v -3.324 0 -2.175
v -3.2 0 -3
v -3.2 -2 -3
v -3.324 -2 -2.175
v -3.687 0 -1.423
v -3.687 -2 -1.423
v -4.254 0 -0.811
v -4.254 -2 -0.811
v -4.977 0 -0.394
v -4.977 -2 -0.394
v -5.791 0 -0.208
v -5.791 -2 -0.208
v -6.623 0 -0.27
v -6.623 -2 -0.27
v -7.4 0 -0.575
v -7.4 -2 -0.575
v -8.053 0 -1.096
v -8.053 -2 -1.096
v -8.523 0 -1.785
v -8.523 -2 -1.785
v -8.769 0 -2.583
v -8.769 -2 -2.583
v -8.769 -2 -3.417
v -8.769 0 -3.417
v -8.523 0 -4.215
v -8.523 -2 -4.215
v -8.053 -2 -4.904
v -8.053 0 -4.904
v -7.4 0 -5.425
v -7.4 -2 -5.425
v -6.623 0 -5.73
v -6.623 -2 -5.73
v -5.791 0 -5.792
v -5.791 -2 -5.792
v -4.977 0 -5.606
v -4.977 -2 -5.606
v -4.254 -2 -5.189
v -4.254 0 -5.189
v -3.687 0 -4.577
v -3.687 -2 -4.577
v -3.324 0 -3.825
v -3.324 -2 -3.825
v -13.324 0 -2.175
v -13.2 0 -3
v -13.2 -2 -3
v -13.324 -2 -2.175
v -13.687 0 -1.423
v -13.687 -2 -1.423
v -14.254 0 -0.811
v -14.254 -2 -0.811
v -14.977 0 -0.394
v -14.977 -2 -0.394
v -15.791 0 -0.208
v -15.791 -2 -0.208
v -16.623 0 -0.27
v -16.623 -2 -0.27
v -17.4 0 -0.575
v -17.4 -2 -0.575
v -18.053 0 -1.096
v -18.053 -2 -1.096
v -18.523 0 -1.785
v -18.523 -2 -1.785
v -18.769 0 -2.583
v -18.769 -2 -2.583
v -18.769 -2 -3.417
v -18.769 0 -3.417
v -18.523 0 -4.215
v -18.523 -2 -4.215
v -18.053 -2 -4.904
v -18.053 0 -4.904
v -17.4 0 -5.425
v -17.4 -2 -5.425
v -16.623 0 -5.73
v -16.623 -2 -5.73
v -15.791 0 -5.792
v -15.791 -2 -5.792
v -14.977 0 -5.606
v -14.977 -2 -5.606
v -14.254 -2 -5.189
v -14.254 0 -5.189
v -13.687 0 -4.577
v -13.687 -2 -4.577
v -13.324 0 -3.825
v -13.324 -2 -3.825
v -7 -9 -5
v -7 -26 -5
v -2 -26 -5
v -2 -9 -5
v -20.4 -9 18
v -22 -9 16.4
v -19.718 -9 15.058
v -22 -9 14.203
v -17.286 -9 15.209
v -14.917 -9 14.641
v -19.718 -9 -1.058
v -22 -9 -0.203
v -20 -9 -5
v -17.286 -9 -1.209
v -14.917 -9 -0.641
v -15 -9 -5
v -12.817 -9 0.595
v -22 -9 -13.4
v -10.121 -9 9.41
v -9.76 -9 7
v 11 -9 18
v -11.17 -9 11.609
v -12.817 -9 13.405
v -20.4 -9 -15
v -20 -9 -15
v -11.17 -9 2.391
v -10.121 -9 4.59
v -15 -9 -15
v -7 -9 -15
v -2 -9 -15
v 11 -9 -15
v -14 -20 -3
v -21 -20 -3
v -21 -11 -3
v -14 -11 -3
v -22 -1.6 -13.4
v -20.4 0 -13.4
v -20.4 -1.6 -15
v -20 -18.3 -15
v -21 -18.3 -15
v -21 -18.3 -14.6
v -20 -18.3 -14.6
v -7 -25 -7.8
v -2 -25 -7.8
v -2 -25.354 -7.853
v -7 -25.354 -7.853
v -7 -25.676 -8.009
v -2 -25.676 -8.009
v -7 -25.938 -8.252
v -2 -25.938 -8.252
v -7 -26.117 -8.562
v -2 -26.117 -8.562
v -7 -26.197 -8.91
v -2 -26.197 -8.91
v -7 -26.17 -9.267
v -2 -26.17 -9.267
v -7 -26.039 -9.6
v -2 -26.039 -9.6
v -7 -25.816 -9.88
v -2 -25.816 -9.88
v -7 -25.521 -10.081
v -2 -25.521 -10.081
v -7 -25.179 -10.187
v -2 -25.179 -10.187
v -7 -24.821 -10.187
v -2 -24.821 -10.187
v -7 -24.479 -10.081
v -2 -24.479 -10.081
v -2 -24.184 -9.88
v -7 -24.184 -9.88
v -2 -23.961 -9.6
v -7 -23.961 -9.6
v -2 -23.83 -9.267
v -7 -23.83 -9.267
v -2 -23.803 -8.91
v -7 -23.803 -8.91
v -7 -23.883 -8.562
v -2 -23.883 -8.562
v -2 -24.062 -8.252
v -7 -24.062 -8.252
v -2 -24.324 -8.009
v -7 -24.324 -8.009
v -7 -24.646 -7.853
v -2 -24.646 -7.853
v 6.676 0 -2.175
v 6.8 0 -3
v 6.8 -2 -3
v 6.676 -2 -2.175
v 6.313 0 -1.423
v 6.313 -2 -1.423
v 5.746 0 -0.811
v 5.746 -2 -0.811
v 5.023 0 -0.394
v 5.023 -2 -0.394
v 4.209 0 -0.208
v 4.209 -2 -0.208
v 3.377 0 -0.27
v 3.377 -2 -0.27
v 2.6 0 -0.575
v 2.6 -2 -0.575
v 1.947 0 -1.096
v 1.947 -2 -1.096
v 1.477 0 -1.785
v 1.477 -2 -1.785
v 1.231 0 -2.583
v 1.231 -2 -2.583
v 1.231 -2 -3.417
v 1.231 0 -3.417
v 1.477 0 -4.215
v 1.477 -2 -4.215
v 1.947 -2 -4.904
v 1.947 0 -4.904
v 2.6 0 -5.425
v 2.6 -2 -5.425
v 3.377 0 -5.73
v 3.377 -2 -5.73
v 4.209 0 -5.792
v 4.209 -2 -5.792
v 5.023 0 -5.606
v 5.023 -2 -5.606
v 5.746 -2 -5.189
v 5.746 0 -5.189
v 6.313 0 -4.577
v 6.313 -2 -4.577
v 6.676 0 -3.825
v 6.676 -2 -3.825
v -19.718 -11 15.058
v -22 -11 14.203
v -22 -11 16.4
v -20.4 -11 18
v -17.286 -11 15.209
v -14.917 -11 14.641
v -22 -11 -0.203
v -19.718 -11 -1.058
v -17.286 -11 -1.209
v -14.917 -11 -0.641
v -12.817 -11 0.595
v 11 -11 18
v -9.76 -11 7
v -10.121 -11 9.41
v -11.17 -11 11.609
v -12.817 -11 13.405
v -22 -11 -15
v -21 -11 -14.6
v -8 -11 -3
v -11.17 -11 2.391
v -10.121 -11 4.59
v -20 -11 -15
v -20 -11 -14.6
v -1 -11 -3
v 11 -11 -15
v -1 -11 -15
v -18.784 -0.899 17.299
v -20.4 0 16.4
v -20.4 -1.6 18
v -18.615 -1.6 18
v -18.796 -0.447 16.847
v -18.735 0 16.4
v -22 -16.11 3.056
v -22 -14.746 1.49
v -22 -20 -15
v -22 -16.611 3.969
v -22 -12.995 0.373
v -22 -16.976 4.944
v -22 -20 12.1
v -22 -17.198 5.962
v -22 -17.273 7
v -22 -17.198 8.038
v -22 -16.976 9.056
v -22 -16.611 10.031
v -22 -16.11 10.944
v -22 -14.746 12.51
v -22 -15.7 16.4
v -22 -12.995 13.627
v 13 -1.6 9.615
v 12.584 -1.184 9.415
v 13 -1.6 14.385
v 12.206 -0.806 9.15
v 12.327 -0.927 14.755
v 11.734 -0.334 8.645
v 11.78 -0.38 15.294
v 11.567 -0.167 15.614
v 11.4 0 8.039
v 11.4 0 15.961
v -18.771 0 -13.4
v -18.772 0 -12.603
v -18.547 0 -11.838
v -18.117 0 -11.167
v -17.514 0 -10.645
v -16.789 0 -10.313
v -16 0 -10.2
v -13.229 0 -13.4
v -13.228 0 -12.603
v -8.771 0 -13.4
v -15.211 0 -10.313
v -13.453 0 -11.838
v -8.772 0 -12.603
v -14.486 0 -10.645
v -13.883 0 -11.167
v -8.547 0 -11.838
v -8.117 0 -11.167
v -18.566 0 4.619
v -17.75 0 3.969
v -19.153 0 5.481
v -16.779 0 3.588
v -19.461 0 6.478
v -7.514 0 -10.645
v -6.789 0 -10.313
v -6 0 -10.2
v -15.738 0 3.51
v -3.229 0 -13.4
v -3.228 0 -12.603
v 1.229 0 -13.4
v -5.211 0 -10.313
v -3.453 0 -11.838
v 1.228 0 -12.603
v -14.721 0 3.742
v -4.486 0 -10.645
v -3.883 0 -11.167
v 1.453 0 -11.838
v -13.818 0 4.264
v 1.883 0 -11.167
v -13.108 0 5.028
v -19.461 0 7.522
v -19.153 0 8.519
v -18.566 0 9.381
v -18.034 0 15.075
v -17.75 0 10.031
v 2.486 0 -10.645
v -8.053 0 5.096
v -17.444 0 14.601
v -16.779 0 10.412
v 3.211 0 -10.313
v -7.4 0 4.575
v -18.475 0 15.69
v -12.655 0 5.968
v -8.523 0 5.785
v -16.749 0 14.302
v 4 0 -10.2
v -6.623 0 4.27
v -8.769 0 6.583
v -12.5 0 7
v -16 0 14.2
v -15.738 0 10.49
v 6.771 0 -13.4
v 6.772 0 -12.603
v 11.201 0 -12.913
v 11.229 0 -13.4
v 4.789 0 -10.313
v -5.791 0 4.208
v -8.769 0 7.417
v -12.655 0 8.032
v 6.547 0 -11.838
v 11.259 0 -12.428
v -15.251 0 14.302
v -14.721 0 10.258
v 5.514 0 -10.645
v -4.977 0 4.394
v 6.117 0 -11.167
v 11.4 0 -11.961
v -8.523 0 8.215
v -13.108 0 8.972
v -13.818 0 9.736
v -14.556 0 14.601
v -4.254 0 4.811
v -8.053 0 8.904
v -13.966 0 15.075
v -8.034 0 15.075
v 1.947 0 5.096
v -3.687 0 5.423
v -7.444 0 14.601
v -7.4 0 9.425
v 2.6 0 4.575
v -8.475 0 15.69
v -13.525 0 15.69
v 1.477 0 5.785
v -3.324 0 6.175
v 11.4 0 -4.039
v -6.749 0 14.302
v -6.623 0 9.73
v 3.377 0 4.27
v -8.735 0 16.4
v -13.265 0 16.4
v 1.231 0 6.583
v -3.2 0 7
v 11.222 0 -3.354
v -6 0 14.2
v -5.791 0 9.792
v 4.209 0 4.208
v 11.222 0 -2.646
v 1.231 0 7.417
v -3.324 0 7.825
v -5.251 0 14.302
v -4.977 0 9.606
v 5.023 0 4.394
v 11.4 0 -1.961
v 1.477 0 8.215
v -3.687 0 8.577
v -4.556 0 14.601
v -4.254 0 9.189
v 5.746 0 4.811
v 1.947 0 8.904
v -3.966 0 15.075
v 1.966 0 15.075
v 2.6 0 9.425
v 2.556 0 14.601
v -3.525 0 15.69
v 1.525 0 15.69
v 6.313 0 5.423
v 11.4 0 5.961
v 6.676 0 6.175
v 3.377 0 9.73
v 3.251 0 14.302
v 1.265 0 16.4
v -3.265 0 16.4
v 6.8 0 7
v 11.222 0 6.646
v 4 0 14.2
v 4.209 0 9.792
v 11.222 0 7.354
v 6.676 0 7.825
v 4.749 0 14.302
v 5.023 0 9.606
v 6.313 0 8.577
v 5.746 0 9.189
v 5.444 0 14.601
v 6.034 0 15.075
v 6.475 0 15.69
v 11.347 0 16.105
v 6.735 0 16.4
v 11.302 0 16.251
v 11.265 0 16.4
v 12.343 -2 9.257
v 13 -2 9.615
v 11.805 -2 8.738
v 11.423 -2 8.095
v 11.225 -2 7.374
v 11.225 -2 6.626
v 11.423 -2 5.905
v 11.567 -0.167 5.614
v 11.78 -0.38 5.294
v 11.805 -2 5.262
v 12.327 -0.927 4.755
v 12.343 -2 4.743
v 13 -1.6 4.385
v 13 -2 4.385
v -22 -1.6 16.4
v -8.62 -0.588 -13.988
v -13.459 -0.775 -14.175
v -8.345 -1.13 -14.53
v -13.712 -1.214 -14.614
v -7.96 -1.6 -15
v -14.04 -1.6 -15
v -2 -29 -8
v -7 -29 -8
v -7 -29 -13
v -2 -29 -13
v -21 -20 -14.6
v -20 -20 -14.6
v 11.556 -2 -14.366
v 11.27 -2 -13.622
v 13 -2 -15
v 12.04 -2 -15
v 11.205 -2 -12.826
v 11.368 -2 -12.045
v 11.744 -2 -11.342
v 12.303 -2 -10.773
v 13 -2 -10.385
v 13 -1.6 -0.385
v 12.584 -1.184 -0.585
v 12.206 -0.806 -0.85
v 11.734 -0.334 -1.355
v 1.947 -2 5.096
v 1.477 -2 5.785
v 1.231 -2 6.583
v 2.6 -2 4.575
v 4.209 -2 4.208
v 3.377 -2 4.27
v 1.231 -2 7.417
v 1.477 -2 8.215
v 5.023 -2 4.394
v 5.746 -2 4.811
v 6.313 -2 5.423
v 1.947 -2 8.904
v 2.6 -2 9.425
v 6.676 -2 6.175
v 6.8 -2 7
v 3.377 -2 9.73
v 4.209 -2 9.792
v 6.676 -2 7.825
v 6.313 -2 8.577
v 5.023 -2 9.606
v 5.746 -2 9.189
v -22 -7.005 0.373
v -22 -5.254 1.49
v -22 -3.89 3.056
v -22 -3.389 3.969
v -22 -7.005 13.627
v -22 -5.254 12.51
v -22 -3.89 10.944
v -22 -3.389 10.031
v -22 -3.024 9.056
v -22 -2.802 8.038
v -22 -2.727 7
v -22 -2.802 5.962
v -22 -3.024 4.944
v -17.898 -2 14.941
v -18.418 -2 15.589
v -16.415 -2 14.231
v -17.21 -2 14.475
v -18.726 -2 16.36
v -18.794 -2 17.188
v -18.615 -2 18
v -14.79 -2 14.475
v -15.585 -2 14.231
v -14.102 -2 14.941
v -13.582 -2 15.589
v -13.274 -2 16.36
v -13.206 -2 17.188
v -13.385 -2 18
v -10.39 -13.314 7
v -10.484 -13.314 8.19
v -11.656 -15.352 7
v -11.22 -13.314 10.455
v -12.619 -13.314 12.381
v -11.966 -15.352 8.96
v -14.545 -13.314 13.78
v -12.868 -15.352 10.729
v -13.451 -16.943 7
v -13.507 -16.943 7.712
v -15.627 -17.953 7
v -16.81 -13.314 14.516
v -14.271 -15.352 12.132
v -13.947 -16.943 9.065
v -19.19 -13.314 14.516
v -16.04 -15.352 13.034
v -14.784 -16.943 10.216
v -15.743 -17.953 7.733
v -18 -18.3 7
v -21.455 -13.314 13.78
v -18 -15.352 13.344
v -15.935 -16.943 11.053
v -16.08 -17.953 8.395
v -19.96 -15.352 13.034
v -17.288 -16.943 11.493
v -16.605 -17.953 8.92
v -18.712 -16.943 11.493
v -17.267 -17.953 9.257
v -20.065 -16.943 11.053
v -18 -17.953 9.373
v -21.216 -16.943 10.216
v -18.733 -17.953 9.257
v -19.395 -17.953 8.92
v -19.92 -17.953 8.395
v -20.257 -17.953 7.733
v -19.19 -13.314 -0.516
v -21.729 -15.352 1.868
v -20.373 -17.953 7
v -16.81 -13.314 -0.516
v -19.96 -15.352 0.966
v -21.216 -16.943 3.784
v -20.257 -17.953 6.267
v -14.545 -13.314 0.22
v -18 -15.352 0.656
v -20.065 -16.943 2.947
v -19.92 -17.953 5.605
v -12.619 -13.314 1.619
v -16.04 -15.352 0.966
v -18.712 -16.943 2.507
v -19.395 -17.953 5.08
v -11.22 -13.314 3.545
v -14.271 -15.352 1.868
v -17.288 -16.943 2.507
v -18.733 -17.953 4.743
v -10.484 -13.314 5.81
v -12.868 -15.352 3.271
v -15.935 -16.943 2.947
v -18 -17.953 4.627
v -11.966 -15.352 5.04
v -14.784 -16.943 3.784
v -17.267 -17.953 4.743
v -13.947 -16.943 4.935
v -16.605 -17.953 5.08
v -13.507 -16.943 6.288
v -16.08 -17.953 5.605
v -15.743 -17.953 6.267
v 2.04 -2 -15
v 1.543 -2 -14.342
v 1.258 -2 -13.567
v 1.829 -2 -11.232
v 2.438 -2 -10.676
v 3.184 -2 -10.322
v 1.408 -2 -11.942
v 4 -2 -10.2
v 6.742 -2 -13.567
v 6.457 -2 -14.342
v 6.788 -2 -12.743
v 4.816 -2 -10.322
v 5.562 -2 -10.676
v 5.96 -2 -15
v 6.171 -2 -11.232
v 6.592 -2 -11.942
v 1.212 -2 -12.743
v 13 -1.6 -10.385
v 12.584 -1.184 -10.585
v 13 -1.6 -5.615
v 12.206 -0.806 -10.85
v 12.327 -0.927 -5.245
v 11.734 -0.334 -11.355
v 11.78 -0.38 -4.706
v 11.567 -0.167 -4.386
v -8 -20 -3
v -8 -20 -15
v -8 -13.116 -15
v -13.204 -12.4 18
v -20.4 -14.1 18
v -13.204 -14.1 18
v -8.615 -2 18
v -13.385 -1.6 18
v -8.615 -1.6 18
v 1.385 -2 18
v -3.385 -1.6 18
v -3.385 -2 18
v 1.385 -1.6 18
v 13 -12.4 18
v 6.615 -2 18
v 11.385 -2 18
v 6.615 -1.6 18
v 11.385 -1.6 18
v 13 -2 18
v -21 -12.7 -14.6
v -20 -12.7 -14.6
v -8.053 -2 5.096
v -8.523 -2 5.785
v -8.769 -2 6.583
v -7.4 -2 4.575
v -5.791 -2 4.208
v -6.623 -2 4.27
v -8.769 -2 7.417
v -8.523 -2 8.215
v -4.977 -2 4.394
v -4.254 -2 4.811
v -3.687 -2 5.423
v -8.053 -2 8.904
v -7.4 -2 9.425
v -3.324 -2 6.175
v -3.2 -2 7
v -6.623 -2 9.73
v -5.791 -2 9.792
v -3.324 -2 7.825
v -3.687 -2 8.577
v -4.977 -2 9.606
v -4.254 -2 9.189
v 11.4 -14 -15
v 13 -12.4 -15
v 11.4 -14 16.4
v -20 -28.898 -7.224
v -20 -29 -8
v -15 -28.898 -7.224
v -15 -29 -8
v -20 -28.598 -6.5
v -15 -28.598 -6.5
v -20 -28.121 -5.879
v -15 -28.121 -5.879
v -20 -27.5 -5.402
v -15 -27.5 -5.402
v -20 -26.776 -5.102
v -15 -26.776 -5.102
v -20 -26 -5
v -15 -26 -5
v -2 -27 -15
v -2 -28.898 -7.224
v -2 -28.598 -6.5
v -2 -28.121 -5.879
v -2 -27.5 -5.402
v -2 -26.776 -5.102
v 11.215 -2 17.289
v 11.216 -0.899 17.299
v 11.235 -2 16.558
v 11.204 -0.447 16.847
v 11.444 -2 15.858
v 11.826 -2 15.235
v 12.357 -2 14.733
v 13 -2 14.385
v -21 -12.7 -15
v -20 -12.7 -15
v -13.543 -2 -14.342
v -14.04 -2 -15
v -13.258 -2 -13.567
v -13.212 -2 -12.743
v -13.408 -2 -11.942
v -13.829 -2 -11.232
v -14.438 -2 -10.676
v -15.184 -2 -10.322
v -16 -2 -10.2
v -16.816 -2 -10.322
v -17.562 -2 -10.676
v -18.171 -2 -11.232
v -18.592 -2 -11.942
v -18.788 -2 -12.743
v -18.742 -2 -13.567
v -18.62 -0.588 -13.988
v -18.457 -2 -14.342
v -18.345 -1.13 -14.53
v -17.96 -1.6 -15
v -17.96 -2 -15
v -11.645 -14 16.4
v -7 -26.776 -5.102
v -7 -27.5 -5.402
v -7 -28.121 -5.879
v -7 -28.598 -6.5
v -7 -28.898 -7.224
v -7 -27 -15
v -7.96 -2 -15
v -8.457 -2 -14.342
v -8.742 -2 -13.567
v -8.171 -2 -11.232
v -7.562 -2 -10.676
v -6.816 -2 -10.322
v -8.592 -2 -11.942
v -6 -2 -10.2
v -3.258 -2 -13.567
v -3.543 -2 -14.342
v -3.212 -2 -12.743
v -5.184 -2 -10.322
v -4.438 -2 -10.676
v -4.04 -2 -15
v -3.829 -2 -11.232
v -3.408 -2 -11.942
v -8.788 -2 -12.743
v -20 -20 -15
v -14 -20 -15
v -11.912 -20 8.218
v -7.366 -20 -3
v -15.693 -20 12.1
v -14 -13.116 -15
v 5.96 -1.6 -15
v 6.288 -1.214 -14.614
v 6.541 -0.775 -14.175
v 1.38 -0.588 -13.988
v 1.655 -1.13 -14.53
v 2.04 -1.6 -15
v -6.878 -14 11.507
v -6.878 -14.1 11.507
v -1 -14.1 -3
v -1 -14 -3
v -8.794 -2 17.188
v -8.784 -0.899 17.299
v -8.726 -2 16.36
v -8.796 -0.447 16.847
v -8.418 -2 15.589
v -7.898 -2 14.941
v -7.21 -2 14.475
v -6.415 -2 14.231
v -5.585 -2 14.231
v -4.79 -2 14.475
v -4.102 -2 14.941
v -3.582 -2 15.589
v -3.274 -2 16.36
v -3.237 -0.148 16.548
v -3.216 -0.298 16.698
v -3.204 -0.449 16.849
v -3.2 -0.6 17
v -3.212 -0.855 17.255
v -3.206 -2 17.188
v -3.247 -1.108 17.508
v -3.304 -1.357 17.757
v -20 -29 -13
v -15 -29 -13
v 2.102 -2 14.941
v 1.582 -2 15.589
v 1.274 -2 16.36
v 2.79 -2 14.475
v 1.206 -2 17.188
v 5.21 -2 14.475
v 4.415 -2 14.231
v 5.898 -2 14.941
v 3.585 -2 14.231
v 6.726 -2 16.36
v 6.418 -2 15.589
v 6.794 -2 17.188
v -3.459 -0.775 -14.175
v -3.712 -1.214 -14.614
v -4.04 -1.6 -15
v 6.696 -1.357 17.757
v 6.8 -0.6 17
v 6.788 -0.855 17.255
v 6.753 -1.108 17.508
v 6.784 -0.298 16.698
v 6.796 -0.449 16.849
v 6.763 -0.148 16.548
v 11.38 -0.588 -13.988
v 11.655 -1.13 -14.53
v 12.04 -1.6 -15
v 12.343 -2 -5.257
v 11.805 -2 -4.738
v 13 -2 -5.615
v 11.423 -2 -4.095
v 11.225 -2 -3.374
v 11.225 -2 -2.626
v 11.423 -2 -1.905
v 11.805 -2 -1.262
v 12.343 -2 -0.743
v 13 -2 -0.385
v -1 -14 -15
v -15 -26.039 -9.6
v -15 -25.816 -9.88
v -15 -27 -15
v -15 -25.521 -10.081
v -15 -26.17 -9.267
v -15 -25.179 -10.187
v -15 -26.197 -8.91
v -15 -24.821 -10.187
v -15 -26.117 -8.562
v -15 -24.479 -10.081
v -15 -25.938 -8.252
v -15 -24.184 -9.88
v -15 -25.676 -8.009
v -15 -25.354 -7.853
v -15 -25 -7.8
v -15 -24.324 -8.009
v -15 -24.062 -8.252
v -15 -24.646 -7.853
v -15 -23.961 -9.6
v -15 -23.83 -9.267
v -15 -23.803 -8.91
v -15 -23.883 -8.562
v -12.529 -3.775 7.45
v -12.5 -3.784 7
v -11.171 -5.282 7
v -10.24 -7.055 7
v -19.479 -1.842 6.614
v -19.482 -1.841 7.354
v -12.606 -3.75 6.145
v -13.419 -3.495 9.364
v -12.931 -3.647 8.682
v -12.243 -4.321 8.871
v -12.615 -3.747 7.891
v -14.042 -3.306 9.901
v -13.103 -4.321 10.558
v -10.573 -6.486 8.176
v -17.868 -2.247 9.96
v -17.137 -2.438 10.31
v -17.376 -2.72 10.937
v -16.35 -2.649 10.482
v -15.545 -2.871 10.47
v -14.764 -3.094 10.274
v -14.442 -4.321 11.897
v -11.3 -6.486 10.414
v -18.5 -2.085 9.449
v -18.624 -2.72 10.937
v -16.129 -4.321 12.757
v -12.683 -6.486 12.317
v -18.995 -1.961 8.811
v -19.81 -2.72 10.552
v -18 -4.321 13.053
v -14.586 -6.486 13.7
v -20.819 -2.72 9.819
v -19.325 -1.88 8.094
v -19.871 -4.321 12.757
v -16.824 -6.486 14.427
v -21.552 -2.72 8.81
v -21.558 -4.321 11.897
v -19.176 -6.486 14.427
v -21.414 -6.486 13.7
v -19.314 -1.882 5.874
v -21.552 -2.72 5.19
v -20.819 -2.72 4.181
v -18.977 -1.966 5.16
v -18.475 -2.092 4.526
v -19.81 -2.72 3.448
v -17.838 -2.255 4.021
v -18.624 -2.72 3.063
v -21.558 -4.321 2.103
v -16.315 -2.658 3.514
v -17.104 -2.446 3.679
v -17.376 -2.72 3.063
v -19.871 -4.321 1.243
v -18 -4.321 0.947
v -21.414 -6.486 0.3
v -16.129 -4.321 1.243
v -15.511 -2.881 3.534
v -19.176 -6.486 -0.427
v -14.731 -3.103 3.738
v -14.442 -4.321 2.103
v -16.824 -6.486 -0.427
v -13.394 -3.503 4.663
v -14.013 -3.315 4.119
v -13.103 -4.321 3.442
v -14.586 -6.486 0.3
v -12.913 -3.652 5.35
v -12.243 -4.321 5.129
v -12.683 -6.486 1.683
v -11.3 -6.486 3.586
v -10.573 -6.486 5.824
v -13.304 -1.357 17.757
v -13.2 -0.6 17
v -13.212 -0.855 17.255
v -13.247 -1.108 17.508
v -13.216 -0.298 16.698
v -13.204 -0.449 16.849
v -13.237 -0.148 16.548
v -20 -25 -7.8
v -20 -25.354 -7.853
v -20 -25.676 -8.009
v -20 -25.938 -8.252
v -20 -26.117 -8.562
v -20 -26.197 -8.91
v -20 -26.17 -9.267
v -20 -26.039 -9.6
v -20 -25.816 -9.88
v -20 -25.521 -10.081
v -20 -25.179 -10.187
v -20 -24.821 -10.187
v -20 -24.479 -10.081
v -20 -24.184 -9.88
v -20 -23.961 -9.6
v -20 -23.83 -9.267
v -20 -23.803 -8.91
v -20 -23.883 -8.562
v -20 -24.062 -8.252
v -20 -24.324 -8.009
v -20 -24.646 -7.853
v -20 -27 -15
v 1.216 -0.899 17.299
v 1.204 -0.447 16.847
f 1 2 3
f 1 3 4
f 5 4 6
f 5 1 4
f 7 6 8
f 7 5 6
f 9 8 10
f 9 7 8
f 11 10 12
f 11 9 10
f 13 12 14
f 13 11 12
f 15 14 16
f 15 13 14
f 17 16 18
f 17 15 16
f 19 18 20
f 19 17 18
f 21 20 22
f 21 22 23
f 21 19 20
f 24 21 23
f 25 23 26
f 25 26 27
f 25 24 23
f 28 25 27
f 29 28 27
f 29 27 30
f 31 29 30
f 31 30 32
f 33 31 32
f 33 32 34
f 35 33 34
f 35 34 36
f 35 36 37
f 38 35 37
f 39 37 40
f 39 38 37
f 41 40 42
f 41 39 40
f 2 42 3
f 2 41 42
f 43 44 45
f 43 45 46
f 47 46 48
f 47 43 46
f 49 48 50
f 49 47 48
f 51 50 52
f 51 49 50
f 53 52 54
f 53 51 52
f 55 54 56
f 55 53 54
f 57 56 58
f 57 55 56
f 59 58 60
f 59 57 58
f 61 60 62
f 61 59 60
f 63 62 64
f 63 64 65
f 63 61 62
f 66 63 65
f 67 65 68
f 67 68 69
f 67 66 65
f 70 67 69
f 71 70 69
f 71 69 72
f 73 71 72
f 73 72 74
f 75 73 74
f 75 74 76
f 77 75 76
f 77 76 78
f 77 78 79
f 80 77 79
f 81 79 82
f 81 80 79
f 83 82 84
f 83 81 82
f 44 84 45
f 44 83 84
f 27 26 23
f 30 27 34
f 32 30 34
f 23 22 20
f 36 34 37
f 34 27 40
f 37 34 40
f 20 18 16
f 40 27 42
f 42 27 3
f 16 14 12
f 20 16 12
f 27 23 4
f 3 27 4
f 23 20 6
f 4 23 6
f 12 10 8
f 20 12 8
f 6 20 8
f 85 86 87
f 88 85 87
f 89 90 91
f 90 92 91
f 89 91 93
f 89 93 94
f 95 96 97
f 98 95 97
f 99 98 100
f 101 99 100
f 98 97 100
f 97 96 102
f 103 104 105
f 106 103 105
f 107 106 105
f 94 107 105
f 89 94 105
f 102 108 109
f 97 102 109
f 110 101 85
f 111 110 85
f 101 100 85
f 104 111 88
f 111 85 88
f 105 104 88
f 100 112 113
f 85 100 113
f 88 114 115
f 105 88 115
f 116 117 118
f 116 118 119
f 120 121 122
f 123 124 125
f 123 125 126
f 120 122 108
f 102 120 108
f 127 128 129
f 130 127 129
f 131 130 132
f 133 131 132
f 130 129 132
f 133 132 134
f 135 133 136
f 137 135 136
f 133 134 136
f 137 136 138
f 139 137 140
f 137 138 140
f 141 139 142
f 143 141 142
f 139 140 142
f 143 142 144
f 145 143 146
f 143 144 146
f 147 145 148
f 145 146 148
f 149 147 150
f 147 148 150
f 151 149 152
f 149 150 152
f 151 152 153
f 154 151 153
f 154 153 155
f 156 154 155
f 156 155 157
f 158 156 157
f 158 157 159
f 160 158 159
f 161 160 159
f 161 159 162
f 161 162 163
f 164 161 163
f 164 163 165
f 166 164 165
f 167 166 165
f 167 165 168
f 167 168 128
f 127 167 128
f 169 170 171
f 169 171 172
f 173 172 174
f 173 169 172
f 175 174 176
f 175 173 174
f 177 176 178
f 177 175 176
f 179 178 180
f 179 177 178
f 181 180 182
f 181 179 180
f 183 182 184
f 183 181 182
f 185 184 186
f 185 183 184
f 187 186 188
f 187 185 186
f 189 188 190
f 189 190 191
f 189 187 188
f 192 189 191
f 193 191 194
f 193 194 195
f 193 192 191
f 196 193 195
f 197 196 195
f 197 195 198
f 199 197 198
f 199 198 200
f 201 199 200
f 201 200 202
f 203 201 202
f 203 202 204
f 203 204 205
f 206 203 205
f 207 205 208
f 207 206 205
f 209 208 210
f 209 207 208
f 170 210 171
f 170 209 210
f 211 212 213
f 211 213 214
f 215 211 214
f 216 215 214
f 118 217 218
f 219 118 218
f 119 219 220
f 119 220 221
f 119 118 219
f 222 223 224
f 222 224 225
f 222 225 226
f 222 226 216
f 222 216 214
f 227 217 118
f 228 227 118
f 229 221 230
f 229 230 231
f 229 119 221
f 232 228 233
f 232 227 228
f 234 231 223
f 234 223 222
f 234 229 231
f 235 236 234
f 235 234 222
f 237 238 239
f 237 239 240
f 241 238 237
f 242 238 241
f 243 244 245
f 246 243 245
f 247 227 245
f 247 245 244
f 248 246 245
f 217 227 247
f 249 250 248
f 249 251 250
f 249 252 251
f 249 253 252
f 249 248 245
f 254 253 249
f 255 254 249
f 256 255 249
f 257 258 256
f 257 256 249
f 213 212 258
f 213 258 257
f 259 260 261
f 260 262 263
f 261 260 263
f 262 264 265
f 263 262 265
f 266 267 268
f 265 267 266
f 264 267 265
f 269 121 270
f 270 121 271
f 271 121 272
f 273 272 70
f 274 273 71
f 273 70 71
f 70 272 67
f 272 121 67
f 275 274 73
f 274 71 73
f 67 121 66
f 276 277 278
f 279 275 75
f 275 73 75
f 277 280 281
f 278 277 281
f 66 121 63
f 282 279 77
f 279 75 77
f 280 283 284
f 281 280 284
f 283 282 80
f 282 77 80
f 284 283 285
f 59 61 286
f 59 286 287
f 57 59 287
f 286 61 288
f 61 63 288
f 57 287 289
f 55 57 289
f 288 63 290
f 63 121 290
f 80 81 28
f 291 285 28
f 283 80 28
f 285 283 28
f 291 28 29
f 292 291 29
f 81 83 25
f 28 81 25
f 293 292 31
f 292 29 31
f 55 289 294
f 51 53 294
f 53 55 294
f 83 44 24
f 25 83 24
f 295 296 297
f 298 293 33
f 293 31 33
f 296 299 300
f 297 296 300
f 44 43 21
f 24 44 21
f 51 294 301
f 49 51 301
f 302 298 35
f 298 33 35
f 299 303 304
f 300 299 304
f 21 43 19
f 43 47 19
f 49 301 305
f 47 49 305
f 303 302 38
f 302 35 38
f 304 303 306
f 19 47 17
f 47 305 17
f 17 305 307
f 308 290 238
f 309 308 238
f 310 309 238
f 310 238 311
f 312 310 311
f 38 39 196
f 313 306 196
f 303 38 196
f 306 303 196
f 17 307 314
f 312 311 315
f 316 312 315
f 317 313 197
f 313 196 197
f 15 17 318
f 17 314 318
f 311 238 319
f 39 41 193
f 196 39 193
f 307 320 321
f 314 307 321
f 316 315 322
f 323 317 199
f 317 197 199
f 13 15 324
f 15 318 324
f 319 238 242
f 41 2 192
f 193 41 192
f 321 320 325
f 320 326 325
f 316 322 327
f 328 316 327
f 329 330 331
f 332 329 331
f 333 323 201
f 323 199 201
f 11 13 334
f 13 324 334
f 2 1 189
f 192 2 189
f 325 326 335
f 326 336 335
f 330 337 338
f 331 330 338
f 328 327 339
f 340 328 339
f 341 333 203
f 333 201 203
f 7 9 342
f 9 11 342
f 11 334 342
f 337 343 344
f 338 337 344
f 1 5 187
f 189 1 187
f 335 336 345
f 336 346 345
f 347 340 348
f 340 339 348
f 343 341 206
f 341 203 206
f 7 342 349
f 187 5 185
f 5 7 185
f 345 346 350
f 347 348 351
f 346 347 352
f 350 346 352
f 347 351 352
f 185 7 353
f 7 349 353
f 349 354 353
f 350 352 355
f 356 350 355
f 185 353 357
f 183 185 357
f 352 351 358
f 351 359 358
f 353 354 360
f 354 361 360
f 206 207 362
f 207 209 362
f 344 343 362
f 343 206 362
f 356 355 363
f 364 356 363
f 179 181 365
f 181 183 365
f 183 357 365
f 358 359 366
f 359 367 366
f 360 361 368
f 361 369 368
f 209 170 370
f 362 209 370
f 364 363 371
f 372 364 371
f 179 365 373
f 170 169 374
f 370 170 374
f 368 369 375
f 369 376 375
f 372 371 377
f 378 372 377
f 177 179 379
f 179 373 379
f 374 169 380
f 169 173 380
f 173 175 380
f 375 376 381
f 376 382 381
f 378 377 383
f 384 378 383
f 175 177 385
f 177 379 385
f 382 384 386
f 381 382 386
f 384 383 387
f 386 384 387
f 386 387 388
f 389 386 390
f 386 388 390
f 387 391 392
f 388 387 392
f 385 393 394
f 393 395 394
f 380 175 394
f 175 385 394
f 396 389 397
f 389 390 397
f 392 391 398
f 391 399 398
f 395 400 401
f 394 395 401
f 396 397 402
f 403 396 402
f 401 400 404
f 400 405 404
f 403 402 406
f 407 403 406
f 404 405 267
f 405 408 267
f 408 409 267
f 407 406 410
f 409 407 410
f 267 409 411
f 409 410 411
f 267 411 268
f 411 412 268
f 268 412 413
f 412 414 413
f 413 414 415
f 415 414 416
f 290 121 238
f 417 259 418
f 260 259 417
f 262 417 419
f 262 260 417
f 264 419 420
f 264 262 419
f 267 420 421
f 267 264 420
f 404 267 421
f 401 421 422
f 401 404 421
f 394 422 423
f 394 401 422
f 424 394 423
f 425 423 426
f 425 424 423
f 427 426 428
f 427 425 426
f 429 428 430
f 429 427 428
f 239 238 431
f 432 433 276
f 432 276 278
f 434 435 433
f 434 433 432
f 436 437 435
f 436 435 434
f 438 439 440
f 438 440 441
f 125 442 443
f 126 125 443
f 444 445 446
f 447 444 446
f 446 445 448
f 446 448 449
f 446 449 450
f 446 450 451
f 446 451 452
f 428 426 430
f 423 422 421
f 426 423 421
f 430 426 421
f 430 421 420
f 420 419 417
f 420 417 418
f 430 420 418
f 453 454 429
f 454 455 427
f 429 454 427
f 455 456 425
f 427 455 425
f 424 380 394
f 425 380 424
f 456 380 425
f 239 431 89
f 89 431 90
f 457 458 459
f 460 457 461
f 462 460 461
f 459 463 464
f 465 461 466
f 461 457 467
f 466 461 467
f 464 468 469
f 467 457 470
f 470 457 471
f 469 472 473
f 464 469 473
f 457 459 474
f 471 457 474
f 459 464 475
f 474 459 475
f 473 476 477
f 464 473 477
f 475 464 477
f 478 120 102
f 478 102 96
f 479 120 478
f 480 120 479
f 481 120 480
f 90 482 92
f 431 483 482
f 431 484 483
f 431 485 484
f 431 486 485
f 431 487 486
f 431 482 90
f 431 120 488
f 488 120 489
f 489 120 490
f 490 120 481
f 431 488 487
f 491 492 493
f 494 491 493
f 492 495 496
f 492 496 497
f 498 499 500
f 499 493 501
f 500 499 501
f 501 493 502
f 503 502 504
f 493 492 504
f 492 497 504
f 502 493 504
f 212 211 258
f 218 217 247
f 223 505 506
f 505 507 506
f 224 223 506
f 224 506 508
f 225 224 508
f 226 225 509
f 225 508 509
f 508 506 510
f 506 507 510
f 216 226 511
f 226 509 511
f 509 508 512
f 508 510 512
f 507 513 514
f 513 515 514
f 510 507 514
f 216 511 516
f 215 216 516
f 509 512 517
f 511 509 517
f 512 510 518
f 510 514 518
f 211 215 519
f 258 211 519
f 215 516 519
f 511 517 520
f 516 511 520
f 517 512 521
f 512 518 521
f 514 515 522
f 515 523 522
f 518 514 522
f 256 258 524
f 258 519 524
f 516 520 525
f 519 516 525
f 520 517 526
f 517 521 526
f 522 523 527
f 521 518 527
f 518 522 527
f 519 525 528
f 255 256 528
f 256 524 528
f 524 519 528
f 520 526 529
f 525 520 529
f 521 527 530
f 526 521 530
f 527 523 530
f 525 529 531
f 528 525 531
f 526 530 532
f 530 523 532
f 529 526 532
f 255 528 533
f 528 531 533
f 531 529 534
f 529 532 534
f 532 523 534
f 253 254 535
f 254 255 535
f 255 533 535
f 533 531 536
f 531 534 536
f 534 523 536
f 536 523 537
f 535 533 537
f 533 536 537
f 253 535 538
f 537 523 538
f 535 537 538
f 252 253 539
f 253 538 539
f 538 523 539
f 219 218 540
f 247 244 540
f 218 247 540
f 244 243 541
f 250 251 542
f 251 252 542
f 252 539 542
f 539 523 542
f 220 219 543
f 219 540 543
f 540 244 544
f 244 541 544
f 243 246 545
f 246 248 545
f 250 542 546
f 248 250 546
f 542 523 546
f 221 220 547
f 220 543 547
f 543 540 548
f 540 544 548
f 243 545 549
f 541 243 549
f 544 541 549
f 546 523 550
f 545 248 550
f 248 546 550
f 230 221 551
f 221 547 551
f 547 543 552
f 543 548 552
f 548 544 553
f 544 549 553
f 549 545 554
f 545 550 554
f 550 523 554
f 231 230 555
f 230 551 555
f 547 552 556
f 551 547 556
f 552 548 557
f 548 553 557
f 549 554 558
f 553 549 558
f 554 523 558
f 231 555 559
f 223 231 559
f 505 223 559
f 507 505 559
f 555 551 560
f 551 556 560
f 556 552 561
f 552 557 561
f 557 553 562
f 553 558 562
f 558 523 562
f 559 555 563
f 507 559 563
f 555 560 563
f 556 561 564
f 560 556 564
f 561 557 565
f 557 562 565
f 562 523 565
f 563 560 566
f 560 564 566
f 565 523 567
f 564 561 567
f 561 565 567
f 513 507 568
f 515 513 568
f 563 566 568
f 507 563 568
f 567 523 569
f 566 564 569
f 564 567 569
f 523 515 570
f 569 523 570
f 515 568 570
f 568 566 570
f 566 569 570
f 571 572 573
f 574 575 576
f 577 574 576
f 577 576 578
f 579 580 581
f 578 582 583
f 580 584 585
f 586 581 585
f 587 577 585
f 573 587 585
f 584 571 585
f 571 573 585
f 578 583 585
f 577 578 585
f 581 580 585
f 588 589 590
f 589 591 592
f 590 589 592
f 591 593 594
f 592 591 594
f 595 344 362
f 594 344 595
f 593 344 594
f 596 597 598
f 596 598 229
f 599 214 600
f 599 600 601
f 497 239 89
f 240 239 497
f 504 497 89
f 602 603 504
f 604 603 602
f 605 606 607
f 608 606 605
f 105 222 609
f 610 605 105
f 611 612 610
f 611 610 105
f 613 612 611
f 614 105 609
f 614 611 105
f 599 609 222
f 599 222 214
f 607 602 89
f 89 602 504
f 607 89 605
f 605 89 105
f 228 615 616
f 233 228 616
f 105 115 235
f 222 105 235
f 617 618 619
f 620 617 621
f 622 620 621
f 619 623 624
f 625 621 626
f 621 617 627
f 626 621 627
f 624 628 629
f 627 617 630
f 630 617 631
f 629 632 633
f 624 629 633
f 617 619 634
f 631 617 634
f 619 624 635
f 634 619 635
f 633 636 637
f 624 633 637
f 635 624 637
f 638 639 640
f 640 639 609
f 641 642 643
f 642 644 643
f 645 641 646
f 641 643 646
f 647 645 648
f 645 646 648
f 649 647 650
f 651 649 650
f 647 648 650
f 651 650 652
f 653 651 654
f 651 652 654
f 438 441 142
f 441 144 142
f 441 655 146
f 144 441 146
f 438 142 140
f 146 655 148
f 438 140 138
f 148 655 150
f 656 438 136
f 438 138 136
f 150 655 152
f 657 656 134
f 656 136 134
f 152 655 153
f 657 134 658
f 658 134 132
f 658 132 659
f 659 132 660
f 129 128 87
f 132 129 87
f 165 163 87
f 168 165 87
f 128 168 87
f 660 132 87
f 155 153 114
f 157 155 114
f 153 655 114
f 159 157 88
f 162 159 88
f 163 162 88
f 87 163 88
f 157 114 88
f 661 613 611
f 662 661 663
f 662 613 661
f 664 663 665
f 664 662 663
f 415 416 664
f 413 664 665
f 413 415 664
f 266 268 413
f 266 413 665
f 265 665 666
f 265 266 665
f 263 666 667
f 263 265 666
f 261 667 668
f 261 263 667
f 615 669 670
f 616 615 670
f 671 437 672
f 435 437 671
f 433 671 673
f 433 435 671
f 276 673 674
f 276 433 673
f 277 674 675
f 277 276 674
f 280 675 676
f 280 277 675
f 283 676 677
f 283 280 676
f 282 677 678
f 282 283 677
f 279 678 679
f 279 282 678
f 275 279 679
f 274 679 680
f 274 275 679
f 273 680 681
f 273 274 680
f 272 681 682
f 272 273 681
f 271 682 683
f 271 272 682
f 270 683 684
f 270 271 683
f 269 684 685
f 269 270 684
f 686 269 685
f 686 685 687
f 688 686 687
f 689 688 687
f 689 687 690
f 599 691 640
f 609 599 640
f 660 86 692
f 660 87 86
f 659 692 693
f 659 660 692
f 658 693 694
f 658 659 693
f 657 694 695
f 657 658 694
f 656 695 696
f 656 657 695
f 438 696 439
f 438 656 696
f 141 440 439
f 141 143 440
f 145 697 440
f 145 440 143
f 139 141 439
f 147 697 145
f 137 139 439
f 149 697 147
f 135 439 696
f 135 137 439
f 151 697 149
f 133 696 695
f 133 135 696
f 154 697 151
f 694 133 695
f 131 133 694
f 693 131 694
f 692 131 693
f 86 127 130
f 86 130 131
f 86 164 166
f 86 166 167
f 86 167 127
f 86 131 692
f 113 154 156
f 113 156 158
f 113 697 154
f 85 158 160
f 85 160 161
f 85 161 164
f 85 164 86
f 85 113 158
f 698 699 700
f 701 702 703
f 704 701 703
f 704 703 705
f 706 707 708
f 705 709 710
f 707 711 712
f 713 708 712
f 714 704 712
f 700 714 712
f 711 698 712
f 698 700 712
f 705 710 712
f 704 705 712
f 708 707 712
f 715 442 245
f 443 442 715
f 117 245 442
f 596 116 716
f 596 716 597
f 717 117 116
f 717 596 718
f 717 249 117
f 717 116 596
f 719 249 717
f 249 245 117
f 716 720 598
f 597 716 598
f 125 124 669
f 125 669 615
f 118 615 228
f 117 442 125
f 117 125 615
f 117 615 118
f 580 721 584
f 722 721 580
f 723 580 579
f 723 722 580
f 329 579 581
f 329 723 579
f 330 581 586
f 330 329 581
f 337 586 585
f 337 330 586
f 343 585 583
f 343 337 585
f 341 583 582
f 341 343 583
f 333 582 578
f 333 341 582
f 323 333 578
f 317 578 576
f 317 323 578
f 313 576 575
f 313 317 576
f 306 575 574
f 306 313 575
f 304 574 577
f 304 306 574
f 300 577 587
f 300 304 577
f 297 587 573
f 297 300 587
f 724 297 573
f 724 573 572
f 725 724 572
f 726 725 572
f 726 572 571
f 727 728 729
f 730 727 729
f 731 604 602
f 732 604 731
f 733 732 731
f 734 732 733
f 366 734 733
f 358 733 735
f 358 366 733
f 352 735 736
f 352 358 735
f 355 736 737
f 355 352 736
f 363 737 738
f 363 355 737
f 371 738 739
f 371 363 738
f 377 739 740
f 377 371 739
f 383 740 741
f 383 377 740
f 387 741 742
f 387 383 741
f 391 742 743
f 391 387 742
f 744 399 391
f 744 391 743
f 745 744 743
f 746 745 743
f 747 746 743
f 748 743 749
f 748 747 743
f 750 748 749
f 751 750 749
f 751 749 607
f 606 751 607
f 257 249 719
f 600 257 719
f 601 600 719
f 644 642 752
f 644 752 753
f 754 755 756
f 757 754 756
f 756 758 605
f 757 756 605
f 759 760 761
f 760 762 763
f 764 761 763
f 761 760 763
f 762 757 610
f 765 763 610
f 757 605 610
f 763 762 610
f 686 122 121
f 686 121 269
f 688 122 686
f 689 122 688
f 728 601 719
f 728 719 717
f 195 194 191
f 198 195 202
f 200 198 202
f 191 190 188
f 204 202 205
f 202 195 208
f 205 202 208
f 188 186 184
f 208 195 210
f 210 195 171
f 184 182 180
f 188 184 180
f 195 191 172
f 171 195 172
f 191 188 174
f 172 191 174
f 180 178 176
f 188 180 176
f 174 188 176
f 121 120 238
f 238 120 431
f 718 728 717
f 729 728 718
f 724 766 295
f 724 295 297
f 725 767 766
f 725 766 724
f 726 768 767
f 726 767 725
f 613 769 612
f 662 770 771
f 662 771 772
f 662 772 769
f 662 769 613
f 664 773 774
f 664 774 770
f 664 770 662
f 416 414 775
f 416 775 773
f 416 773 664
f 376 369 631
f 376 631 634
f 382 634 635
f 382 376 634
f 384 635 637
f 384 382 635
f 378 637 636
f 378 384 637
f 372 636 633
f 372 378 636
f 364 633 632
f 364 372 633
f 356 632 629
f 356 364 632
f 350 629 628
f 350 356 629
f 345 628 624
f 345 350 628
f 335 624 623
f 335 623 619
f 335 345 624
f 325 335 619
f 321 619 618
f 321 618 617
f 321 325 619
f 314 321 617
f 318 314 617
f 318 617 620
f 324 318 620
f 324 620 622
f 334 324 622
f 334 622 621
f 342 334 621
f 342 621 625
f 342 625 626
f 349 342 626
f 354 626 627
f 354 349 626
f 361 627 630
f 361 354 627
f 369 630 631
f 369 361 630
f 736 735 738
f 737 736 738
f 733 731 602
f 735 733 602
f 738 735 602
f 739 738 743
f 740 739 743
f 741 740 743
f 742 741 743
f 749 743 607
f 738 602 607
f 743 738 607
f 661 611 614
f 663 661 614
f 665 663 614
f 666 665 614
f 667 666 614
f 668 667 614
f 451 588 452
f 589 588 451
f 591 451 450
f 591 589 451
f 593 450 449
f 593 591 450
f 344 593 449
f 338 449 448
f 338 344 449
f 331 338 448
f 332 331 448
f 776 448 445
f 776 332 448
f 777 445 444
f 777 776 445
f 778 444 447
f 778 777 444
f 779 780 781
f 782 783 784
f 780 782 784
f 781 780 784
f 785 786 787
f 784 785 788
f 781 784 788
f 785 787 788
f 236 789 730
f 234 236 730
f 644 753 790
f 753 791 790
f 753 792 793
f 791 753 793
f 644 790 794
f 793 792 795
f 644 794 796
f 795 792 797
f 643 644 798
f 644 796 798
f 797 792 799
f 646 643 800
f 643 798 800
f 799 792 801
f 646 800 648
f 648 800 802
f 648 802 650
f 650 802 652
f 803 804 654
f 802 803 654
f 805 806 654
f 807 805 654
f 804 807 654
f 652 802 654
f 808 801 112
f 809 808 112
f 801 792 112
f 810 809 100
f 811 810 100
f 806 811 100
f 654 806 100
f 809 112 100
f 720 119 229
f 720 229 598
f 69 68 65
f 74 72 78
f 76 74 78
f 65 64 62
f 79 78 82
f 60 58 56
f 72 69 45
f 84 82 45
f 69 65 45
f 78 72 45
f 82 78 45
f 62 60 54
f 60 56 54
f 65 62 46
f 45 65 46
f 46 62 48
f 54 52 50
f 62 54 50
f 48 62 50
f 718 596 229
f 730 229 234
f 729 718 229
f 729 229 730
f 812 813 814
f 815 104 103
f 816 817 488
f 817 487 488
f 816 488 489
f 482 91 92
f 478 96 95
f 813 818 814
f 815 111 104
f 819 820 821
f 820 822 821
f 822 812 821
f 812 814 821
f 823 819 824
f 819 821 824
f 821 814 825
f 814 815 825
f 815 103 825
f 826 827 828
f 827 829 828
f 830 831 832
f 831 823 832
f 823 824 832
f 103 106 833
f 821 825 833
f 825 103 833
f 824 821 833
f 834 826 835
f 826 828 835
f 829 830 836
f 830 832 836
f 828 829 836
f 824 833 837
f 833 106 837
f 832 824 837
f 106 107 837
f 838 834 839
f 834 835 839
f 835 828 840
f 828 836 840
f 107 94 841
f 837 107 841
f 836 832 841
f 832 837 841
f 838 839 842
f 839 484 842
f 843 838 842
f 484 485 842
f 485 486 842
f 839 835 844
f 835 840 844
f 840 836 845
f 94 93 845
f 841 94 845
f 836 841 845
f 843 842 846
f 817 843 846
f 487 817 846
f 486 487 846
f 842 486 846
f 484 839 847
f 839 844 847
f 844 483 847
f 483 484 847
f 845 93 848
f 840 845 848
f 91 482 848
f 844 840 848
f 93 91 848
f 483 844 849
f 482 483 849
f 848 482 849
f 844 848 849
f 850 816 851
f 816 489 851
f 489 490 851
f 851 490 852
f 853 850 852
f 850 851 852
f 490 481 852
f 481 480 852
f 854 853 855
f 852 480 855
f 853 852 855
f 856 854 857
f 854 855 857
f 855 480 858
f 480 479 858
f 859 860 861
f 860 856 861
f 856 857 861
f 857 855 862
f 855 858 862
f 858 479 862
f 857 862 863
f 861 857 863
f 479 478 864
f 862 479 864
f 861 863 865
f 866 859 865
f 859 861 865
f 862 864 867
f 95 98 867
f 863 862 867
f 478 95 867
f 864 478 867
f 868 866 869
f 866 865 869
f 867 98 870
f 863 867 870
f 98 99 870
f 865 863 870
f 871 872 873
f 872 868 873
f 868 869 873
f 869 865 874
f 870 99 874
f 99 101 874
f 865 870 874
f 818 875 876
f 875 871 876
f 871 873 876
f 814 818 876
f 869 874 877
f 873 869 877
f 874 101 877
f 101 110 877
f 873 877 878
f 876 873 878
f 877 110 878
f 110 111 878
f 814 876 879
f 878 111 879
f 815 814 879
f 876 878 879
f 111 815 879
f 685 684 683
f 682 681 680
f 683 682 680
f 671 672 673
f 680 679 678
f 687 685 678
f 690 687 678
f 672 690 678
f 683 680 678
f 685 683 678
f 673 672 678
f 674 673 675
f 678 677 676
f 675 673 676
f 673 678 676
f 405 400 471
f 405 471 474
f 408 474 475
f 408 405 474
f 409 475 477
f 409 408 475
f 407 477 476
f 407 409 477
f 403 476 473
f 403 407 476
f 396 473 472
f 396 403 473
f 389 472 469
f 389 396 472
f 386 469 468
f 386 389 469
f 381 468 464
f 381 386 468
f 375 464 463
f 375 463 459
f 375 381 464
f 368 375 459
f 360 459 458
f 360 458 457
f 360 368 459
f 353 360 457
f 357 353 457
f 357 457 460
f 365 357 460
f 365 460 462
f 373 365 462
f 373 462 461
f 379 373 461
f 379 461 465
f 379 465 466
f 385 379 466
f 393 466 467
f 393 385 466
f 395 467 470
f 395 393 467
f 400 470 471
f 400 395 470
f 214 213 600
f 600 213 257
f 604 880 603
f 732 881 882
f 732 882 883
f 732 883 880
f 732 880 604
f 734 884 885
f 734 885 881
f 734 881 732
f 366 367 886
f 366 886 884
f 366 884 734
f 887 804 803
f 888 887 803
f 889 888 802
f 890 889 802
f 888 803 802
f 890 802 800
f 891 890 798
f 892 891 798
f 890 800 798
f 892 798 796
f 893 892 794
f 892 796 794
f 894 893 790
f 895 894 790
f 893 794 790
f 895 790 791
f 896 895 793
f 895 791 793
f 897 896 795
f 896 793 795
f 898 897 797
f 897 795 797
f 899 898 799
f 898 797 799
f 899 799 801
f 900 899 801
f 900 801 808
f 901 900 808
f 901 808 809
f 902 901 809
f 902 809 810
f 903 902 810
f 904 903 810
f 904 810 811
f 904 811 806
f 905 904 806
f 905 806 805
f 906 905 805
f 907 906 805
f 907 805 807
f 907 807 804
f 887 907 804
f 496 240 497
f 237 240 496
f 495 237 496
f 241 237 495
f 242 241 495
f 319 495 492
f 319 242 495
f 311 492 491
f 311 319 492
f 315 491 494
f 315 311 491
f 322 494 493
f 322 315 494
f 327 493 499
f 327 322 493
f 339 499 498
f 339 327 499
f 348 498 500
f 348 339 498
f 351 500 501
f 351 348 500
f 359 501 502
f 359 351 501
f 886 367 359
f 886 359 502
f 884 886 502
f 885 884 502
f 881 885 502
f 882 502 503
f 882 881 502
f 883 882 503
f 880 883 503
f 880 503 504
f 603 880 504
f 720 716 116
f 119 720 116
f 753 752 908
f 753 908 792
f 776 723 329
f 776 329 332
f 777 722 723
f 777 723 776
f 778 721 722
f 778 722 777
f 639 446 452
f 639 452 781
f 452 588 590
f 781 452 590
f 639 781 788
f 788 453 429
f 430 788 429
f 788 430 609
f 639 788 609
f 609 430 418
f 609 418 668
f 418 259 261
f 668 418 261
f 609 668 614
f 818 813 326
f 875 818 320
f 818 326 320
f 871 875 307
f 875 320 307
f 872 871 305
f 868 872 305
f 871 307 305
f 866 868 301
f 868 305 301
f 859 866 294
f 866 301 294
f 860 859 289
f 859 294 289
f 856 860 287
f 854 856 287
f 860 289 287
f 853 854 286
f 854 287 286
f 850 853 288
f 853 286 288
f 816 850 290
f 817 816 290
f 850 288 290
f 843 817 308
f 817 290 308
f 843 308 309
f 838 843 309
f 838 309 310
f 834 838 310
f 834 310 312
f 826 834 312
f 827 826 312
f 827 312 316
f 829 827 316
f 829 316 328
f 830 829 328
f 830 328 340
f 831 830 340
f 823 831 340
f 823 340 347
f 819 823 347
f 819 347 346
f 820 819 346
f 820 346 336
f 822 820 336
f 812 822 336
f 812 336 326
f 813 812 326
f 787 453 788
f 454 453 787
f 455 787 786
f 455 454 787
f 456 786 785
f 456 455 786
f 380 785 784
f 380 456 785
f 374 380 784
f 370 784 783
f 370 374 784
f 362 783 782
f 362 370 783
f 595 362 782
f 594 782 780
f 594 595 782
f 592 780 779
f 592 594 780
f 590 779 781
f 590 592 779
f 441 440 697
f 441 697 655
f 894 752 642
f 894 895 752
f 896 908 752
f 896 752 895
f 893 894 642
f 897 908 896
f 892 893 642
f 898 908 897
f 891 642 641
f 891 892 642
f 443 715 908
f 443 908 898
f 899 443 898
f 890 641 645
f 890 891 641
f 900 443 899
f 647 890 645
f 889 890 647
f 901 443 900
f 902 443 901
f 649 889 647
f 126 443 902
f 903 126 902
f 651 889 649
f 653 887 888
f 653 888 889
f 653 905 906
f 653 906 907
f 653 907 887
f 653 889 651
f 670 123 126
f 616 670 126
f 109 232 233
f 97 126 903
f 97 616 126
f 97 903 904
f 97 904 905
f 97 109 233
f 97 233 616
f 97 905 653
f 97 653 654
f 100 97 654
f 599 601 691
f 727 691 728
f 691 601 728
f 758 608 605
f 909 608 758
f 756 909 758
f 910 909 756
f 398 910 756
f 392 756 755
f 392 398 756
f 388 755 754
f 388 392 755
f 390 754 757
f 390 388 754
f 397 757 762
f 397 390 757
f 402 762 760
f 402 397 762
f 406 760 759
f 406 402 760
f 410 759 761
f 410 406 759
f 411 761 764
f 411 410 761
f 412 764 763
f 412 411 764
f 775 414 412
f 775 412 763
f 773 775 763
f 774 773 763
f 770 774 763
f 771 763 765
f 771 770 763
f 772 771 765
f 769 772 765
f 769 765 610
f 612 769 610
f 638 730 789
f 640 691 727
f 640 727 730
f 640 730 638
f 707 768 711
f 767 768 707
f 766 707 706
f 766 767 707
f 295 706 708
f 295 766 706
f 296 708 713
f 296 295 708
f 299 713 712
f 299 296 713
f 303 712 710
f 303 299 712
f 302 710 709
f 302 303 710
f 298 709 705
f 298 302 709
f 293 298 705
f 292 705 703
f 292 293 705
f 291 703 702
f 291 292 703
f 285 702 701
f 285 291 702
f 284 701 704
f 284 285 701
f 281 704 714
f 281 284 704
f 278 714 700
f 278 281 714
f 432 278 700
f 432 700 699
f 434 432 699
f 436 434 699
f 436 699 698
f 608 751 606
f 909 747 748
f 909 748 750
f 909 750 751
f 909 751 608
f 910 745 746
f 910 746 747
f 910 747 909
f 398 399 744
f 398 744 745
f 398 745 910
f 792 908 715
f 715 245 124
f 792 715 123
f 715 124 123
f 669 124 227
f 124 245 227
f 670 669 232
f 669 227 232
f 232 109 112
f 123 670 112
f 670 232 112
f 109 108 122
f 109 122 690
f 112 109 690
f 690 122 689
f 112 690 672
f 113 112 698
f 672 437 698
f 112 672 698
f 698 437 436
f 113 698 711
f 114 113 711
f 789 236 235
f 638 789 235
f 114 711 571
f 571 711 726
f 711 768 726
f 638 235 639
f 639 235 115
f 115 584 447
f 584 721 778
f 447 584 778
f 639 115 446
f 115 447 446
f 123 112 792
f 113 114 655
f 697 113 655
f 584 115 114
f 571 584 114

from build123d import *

# Parameters (mm, degrees)
SKETCH_W                 = 35
SKETCH_H                 = 33
PAD_DEPTH                = 20
SKETCH001_W              = 7
SKETCH001_H              = 12
POCKET_DEPTH             = 10
SKETCH004_W              = 36
SKETCH004_H              = 2
POCKET002_DEPTH          = 18.001
POCKET002_DEPTH_BACK     = 15.001
SKETCH002_W              = 5
SKETCH002_H              = 10
PAD001_DEPTH             = 20
SKETCH003_R              = 1.2
POCKET001_DEPTH          = 22.001
POCKET003_DEPTH          = 6
CHAMFER_SIZE             = 5.9
CHAMFER001_SIZE          = 1.6
CHAMFER002_SIZE          = 2
FILLET_R                 = 3
SKETCH010_R              = 2.8
POCKET006_DEPTH          = 2
LINEARPATTERN_COUNT      = 4
LINEARPATTERN_PITCH      = 10
SKETCH012_R              = 3.5
POCKET007_DEPTH          = 8
SKETCH013_W              = 3.523392
SKETCH013_H              = 1.7
SKETCH013_W_2            = 3.89822
PAD003_DEPTH             = 0.4
POCKET008_DEPTH          = 6
CLONE001_PLACEMENT_ANGLE = 90


with BuildPart() as sphere:
    # Sphere → Sphere (revolve)
    with BuildSketch(Plane(origin=(-18, 7, 10), x_dir=(1, 0, 0), z_dir=(0, -1, 0))):
        with BuildLine():
            ThreePointArc((0, -8.3), (8.3, 0), (0, 8.3))
            Line((0, 8.3), (0, -8.3))
        make_face()
    revolve(axis=Axis((-18, 7, 10), (0, 0, 1)))


with BuildPart() as out_socket:
    # Sketch → Pad (new body)
    with BuildSketch(Plane.XY):
        with Locations((-4.5, 1.5)):
            Rectangle(SKETCH_W, SKETCH_H)
    extrude(amount=PAD_DEPTH)

    # Sketch001 (on Face6 of Pad) → Pocket (cut)
    with BuildSketch(Plane.XY.offset(20)):
        with Locations((-17.5, -9)):
            Rectangle(SKETCH001_W, SKETCH001_H)
        with Locations((-4.5, -9)):
            Rectangle(SKETCH001_W, SKETCH001_H)
    extrude(amount=-POCKET_DEPTH, mode=Mode.SUBTRACT)

    # Sketch004 → Pocket002 (cut, two sides)
    with BuildSketch(Plane.XZ) as pocket002_sk:
        with Locations((-7, 10)):
            Rectangle(SKETCH004_W, SKETCH004_H)
    extrude(amount=-POCKET002_DEPTH, mode=Mode.SUBTRACT)
    extrude(pocket002_sk.sketch, amount=POCKET002_DEPTH_BACK, mode=Mode.SUBTRACT)

    # Sketch002 (on Face8 of Pocket002) → Pad001 (join)
    with BuildSketch(Plane.XY.offset(9)):
        with Locations((-17.5, -10)):
            Rectangle(SKETCH002_W, SKETCH002_H)
        with Locations((-4.5, -10)):
            Rectangle(SKETCH002_W, SKETCH002_H)
    extrude(amount=PAD001_DEPTH)

    # Sketch003 → Pocket001 (cut, through all)
    with BuildSketch(Plane.YZ):
        with Locations((-9, 25)):
            Circle(SKETCH003_R)
    extrude(amount=-POCKET001_DEPTH, mode=Mode.SUBTRACT)

    # Sketch005 (on Face4 of Pocket001) → Pocket003 (cut)
    with BuildSketch(Plane.XY.offset(20)):
        Polygon((-6.878414, 11.506697), (-1, -3), (-1, -16.521692), (16.145611, -16.521692), (16.145611, 20.333527), (-18.556482, 20.333527), (-13.204168, 18), align=None)
    extrude(amount=-POCKET003_DEPTH, mode=Mode.SUBTRACT)

    # Chamfer
    chamfer_edges = [out_socket.edges().sort_by_distance(p)[0] for p in [
        (-17.602084, 18, 20),
        (-10.041291, 14.753349, 20),
        (-3.939207, 4.253349, 20),
    ]]
    chamfer(chamfer_edges, length=CHAMFER_SIZE)

    # Chamfer001
    chamfer001_edges = [out_socket.edges().sort_by_distance(p)[0] for p in [
        (-4.5, 18, 0),
        (13, 1.5, 0),
        (-4.5, -15, 0),
        (-22, 1.5, 0),
        (-22, 18, 4.5),
        (-22, -15, 4.5),
        (-22, 18, 12.55),
        (13, 1.5, 14),
        (-0.102084, 18, 14),
    ]]
    chamfer(chamfer001_edges, length=CHAMFER001_SIZE)

    # Chamfer002
    chamfer002_edges = [out_socket.edges().sort_by_distance(p)[0] for p in [
        (-17.5, -15, 29),
        (-4.5, -15, 29),
    ]]
    chamfer(chamfer002_edges, length=CHAMFER002_SIZE)

    # Fillet
    fillet_edges = [out_socket.edges().sort_by_distance(p)[0] for p in [
        (-4.5, -5, 29),
        (-17.5, -5, 29),
    ]]
    fillet(fillet_edges, radius=FILLET_R)

    # Sketch010 → Pocket006 (cut)
    with BuildSketch(Plane.XY):
        with Locations((14, -13)):
            Circle(SKETCH010_R)
        with Locations((4, -13)):
            Circle(SKETCH010_R)
        with Locations((-6, -13)):
            Circle(SKETCH010_R)
        with Locations((-16, -13)):
            Circle(SKETCH010_R)
    pocket006 = extrude(amount=POCKET006_DEPTH, mode=Mode.SUBTRACT)

    # LinearPattern: Pocket006 ×4
    with Locations(*[(0, i * LINEARPATTERN_PITCH, 0) for i in range(1, LINEARPATTERN_COUNT)]):
        add(pocket006, mode=Mode.SUBTRACT)

    # Sketch012 (on Face5 of Pad) → Pocket007 (cut)
    with BuildSketch(Plane(origin=(0, 0, 0), x_dir=(1, 0, 0), z_dir=(0, 0, -1))):
        with Locations((-16, -7)):
            Circle(SKETCH012_R)
    extrude(amount=-POCKET007_DEPTH, mode=Mode.SUBTRACT)

    # Sketch013 (on Face3 of Pad) → Pad003 (join)
    with BuildSketch(Plane.XZ.offset(15)):
        with Locations((-19.82605, 19.15)):
            Rectangle(SKETCH013_W, SKETCH013_H)
        with Locations((-19.451214, 11.85)):
            Rectangle(SKETCH013_W_2, SKETCH013_H)
    extrude(amount=-PAD003_DEPTH)

    # Sketch014 (on Face9 of Pocket) → Pocket008 (cut)
    with BuildSketch(Plane(origin=(-14, 0, 0), x_dir=(0, -1, 0), z_dir=(-1, 0, 0))):
        Polygon((3, 11), (23, 14.52654), (23, 11), align=None)
    extrude(amount=-POCKET008_DEPTH, mode=Mode.SUBTRACT)

    # Cut: cut Sphere
    add(sphere.part, mode=Mode.SUBTRACT)


with BuildPart() as out_socket_1:
    # Clone001 placement: moved
    add(out_socket.part.rotate(Axis((0, 0, 0), (1, 0, 0)), CLONE001_PLACEMENT_ANGLE))


solid = out_socket_1.part
